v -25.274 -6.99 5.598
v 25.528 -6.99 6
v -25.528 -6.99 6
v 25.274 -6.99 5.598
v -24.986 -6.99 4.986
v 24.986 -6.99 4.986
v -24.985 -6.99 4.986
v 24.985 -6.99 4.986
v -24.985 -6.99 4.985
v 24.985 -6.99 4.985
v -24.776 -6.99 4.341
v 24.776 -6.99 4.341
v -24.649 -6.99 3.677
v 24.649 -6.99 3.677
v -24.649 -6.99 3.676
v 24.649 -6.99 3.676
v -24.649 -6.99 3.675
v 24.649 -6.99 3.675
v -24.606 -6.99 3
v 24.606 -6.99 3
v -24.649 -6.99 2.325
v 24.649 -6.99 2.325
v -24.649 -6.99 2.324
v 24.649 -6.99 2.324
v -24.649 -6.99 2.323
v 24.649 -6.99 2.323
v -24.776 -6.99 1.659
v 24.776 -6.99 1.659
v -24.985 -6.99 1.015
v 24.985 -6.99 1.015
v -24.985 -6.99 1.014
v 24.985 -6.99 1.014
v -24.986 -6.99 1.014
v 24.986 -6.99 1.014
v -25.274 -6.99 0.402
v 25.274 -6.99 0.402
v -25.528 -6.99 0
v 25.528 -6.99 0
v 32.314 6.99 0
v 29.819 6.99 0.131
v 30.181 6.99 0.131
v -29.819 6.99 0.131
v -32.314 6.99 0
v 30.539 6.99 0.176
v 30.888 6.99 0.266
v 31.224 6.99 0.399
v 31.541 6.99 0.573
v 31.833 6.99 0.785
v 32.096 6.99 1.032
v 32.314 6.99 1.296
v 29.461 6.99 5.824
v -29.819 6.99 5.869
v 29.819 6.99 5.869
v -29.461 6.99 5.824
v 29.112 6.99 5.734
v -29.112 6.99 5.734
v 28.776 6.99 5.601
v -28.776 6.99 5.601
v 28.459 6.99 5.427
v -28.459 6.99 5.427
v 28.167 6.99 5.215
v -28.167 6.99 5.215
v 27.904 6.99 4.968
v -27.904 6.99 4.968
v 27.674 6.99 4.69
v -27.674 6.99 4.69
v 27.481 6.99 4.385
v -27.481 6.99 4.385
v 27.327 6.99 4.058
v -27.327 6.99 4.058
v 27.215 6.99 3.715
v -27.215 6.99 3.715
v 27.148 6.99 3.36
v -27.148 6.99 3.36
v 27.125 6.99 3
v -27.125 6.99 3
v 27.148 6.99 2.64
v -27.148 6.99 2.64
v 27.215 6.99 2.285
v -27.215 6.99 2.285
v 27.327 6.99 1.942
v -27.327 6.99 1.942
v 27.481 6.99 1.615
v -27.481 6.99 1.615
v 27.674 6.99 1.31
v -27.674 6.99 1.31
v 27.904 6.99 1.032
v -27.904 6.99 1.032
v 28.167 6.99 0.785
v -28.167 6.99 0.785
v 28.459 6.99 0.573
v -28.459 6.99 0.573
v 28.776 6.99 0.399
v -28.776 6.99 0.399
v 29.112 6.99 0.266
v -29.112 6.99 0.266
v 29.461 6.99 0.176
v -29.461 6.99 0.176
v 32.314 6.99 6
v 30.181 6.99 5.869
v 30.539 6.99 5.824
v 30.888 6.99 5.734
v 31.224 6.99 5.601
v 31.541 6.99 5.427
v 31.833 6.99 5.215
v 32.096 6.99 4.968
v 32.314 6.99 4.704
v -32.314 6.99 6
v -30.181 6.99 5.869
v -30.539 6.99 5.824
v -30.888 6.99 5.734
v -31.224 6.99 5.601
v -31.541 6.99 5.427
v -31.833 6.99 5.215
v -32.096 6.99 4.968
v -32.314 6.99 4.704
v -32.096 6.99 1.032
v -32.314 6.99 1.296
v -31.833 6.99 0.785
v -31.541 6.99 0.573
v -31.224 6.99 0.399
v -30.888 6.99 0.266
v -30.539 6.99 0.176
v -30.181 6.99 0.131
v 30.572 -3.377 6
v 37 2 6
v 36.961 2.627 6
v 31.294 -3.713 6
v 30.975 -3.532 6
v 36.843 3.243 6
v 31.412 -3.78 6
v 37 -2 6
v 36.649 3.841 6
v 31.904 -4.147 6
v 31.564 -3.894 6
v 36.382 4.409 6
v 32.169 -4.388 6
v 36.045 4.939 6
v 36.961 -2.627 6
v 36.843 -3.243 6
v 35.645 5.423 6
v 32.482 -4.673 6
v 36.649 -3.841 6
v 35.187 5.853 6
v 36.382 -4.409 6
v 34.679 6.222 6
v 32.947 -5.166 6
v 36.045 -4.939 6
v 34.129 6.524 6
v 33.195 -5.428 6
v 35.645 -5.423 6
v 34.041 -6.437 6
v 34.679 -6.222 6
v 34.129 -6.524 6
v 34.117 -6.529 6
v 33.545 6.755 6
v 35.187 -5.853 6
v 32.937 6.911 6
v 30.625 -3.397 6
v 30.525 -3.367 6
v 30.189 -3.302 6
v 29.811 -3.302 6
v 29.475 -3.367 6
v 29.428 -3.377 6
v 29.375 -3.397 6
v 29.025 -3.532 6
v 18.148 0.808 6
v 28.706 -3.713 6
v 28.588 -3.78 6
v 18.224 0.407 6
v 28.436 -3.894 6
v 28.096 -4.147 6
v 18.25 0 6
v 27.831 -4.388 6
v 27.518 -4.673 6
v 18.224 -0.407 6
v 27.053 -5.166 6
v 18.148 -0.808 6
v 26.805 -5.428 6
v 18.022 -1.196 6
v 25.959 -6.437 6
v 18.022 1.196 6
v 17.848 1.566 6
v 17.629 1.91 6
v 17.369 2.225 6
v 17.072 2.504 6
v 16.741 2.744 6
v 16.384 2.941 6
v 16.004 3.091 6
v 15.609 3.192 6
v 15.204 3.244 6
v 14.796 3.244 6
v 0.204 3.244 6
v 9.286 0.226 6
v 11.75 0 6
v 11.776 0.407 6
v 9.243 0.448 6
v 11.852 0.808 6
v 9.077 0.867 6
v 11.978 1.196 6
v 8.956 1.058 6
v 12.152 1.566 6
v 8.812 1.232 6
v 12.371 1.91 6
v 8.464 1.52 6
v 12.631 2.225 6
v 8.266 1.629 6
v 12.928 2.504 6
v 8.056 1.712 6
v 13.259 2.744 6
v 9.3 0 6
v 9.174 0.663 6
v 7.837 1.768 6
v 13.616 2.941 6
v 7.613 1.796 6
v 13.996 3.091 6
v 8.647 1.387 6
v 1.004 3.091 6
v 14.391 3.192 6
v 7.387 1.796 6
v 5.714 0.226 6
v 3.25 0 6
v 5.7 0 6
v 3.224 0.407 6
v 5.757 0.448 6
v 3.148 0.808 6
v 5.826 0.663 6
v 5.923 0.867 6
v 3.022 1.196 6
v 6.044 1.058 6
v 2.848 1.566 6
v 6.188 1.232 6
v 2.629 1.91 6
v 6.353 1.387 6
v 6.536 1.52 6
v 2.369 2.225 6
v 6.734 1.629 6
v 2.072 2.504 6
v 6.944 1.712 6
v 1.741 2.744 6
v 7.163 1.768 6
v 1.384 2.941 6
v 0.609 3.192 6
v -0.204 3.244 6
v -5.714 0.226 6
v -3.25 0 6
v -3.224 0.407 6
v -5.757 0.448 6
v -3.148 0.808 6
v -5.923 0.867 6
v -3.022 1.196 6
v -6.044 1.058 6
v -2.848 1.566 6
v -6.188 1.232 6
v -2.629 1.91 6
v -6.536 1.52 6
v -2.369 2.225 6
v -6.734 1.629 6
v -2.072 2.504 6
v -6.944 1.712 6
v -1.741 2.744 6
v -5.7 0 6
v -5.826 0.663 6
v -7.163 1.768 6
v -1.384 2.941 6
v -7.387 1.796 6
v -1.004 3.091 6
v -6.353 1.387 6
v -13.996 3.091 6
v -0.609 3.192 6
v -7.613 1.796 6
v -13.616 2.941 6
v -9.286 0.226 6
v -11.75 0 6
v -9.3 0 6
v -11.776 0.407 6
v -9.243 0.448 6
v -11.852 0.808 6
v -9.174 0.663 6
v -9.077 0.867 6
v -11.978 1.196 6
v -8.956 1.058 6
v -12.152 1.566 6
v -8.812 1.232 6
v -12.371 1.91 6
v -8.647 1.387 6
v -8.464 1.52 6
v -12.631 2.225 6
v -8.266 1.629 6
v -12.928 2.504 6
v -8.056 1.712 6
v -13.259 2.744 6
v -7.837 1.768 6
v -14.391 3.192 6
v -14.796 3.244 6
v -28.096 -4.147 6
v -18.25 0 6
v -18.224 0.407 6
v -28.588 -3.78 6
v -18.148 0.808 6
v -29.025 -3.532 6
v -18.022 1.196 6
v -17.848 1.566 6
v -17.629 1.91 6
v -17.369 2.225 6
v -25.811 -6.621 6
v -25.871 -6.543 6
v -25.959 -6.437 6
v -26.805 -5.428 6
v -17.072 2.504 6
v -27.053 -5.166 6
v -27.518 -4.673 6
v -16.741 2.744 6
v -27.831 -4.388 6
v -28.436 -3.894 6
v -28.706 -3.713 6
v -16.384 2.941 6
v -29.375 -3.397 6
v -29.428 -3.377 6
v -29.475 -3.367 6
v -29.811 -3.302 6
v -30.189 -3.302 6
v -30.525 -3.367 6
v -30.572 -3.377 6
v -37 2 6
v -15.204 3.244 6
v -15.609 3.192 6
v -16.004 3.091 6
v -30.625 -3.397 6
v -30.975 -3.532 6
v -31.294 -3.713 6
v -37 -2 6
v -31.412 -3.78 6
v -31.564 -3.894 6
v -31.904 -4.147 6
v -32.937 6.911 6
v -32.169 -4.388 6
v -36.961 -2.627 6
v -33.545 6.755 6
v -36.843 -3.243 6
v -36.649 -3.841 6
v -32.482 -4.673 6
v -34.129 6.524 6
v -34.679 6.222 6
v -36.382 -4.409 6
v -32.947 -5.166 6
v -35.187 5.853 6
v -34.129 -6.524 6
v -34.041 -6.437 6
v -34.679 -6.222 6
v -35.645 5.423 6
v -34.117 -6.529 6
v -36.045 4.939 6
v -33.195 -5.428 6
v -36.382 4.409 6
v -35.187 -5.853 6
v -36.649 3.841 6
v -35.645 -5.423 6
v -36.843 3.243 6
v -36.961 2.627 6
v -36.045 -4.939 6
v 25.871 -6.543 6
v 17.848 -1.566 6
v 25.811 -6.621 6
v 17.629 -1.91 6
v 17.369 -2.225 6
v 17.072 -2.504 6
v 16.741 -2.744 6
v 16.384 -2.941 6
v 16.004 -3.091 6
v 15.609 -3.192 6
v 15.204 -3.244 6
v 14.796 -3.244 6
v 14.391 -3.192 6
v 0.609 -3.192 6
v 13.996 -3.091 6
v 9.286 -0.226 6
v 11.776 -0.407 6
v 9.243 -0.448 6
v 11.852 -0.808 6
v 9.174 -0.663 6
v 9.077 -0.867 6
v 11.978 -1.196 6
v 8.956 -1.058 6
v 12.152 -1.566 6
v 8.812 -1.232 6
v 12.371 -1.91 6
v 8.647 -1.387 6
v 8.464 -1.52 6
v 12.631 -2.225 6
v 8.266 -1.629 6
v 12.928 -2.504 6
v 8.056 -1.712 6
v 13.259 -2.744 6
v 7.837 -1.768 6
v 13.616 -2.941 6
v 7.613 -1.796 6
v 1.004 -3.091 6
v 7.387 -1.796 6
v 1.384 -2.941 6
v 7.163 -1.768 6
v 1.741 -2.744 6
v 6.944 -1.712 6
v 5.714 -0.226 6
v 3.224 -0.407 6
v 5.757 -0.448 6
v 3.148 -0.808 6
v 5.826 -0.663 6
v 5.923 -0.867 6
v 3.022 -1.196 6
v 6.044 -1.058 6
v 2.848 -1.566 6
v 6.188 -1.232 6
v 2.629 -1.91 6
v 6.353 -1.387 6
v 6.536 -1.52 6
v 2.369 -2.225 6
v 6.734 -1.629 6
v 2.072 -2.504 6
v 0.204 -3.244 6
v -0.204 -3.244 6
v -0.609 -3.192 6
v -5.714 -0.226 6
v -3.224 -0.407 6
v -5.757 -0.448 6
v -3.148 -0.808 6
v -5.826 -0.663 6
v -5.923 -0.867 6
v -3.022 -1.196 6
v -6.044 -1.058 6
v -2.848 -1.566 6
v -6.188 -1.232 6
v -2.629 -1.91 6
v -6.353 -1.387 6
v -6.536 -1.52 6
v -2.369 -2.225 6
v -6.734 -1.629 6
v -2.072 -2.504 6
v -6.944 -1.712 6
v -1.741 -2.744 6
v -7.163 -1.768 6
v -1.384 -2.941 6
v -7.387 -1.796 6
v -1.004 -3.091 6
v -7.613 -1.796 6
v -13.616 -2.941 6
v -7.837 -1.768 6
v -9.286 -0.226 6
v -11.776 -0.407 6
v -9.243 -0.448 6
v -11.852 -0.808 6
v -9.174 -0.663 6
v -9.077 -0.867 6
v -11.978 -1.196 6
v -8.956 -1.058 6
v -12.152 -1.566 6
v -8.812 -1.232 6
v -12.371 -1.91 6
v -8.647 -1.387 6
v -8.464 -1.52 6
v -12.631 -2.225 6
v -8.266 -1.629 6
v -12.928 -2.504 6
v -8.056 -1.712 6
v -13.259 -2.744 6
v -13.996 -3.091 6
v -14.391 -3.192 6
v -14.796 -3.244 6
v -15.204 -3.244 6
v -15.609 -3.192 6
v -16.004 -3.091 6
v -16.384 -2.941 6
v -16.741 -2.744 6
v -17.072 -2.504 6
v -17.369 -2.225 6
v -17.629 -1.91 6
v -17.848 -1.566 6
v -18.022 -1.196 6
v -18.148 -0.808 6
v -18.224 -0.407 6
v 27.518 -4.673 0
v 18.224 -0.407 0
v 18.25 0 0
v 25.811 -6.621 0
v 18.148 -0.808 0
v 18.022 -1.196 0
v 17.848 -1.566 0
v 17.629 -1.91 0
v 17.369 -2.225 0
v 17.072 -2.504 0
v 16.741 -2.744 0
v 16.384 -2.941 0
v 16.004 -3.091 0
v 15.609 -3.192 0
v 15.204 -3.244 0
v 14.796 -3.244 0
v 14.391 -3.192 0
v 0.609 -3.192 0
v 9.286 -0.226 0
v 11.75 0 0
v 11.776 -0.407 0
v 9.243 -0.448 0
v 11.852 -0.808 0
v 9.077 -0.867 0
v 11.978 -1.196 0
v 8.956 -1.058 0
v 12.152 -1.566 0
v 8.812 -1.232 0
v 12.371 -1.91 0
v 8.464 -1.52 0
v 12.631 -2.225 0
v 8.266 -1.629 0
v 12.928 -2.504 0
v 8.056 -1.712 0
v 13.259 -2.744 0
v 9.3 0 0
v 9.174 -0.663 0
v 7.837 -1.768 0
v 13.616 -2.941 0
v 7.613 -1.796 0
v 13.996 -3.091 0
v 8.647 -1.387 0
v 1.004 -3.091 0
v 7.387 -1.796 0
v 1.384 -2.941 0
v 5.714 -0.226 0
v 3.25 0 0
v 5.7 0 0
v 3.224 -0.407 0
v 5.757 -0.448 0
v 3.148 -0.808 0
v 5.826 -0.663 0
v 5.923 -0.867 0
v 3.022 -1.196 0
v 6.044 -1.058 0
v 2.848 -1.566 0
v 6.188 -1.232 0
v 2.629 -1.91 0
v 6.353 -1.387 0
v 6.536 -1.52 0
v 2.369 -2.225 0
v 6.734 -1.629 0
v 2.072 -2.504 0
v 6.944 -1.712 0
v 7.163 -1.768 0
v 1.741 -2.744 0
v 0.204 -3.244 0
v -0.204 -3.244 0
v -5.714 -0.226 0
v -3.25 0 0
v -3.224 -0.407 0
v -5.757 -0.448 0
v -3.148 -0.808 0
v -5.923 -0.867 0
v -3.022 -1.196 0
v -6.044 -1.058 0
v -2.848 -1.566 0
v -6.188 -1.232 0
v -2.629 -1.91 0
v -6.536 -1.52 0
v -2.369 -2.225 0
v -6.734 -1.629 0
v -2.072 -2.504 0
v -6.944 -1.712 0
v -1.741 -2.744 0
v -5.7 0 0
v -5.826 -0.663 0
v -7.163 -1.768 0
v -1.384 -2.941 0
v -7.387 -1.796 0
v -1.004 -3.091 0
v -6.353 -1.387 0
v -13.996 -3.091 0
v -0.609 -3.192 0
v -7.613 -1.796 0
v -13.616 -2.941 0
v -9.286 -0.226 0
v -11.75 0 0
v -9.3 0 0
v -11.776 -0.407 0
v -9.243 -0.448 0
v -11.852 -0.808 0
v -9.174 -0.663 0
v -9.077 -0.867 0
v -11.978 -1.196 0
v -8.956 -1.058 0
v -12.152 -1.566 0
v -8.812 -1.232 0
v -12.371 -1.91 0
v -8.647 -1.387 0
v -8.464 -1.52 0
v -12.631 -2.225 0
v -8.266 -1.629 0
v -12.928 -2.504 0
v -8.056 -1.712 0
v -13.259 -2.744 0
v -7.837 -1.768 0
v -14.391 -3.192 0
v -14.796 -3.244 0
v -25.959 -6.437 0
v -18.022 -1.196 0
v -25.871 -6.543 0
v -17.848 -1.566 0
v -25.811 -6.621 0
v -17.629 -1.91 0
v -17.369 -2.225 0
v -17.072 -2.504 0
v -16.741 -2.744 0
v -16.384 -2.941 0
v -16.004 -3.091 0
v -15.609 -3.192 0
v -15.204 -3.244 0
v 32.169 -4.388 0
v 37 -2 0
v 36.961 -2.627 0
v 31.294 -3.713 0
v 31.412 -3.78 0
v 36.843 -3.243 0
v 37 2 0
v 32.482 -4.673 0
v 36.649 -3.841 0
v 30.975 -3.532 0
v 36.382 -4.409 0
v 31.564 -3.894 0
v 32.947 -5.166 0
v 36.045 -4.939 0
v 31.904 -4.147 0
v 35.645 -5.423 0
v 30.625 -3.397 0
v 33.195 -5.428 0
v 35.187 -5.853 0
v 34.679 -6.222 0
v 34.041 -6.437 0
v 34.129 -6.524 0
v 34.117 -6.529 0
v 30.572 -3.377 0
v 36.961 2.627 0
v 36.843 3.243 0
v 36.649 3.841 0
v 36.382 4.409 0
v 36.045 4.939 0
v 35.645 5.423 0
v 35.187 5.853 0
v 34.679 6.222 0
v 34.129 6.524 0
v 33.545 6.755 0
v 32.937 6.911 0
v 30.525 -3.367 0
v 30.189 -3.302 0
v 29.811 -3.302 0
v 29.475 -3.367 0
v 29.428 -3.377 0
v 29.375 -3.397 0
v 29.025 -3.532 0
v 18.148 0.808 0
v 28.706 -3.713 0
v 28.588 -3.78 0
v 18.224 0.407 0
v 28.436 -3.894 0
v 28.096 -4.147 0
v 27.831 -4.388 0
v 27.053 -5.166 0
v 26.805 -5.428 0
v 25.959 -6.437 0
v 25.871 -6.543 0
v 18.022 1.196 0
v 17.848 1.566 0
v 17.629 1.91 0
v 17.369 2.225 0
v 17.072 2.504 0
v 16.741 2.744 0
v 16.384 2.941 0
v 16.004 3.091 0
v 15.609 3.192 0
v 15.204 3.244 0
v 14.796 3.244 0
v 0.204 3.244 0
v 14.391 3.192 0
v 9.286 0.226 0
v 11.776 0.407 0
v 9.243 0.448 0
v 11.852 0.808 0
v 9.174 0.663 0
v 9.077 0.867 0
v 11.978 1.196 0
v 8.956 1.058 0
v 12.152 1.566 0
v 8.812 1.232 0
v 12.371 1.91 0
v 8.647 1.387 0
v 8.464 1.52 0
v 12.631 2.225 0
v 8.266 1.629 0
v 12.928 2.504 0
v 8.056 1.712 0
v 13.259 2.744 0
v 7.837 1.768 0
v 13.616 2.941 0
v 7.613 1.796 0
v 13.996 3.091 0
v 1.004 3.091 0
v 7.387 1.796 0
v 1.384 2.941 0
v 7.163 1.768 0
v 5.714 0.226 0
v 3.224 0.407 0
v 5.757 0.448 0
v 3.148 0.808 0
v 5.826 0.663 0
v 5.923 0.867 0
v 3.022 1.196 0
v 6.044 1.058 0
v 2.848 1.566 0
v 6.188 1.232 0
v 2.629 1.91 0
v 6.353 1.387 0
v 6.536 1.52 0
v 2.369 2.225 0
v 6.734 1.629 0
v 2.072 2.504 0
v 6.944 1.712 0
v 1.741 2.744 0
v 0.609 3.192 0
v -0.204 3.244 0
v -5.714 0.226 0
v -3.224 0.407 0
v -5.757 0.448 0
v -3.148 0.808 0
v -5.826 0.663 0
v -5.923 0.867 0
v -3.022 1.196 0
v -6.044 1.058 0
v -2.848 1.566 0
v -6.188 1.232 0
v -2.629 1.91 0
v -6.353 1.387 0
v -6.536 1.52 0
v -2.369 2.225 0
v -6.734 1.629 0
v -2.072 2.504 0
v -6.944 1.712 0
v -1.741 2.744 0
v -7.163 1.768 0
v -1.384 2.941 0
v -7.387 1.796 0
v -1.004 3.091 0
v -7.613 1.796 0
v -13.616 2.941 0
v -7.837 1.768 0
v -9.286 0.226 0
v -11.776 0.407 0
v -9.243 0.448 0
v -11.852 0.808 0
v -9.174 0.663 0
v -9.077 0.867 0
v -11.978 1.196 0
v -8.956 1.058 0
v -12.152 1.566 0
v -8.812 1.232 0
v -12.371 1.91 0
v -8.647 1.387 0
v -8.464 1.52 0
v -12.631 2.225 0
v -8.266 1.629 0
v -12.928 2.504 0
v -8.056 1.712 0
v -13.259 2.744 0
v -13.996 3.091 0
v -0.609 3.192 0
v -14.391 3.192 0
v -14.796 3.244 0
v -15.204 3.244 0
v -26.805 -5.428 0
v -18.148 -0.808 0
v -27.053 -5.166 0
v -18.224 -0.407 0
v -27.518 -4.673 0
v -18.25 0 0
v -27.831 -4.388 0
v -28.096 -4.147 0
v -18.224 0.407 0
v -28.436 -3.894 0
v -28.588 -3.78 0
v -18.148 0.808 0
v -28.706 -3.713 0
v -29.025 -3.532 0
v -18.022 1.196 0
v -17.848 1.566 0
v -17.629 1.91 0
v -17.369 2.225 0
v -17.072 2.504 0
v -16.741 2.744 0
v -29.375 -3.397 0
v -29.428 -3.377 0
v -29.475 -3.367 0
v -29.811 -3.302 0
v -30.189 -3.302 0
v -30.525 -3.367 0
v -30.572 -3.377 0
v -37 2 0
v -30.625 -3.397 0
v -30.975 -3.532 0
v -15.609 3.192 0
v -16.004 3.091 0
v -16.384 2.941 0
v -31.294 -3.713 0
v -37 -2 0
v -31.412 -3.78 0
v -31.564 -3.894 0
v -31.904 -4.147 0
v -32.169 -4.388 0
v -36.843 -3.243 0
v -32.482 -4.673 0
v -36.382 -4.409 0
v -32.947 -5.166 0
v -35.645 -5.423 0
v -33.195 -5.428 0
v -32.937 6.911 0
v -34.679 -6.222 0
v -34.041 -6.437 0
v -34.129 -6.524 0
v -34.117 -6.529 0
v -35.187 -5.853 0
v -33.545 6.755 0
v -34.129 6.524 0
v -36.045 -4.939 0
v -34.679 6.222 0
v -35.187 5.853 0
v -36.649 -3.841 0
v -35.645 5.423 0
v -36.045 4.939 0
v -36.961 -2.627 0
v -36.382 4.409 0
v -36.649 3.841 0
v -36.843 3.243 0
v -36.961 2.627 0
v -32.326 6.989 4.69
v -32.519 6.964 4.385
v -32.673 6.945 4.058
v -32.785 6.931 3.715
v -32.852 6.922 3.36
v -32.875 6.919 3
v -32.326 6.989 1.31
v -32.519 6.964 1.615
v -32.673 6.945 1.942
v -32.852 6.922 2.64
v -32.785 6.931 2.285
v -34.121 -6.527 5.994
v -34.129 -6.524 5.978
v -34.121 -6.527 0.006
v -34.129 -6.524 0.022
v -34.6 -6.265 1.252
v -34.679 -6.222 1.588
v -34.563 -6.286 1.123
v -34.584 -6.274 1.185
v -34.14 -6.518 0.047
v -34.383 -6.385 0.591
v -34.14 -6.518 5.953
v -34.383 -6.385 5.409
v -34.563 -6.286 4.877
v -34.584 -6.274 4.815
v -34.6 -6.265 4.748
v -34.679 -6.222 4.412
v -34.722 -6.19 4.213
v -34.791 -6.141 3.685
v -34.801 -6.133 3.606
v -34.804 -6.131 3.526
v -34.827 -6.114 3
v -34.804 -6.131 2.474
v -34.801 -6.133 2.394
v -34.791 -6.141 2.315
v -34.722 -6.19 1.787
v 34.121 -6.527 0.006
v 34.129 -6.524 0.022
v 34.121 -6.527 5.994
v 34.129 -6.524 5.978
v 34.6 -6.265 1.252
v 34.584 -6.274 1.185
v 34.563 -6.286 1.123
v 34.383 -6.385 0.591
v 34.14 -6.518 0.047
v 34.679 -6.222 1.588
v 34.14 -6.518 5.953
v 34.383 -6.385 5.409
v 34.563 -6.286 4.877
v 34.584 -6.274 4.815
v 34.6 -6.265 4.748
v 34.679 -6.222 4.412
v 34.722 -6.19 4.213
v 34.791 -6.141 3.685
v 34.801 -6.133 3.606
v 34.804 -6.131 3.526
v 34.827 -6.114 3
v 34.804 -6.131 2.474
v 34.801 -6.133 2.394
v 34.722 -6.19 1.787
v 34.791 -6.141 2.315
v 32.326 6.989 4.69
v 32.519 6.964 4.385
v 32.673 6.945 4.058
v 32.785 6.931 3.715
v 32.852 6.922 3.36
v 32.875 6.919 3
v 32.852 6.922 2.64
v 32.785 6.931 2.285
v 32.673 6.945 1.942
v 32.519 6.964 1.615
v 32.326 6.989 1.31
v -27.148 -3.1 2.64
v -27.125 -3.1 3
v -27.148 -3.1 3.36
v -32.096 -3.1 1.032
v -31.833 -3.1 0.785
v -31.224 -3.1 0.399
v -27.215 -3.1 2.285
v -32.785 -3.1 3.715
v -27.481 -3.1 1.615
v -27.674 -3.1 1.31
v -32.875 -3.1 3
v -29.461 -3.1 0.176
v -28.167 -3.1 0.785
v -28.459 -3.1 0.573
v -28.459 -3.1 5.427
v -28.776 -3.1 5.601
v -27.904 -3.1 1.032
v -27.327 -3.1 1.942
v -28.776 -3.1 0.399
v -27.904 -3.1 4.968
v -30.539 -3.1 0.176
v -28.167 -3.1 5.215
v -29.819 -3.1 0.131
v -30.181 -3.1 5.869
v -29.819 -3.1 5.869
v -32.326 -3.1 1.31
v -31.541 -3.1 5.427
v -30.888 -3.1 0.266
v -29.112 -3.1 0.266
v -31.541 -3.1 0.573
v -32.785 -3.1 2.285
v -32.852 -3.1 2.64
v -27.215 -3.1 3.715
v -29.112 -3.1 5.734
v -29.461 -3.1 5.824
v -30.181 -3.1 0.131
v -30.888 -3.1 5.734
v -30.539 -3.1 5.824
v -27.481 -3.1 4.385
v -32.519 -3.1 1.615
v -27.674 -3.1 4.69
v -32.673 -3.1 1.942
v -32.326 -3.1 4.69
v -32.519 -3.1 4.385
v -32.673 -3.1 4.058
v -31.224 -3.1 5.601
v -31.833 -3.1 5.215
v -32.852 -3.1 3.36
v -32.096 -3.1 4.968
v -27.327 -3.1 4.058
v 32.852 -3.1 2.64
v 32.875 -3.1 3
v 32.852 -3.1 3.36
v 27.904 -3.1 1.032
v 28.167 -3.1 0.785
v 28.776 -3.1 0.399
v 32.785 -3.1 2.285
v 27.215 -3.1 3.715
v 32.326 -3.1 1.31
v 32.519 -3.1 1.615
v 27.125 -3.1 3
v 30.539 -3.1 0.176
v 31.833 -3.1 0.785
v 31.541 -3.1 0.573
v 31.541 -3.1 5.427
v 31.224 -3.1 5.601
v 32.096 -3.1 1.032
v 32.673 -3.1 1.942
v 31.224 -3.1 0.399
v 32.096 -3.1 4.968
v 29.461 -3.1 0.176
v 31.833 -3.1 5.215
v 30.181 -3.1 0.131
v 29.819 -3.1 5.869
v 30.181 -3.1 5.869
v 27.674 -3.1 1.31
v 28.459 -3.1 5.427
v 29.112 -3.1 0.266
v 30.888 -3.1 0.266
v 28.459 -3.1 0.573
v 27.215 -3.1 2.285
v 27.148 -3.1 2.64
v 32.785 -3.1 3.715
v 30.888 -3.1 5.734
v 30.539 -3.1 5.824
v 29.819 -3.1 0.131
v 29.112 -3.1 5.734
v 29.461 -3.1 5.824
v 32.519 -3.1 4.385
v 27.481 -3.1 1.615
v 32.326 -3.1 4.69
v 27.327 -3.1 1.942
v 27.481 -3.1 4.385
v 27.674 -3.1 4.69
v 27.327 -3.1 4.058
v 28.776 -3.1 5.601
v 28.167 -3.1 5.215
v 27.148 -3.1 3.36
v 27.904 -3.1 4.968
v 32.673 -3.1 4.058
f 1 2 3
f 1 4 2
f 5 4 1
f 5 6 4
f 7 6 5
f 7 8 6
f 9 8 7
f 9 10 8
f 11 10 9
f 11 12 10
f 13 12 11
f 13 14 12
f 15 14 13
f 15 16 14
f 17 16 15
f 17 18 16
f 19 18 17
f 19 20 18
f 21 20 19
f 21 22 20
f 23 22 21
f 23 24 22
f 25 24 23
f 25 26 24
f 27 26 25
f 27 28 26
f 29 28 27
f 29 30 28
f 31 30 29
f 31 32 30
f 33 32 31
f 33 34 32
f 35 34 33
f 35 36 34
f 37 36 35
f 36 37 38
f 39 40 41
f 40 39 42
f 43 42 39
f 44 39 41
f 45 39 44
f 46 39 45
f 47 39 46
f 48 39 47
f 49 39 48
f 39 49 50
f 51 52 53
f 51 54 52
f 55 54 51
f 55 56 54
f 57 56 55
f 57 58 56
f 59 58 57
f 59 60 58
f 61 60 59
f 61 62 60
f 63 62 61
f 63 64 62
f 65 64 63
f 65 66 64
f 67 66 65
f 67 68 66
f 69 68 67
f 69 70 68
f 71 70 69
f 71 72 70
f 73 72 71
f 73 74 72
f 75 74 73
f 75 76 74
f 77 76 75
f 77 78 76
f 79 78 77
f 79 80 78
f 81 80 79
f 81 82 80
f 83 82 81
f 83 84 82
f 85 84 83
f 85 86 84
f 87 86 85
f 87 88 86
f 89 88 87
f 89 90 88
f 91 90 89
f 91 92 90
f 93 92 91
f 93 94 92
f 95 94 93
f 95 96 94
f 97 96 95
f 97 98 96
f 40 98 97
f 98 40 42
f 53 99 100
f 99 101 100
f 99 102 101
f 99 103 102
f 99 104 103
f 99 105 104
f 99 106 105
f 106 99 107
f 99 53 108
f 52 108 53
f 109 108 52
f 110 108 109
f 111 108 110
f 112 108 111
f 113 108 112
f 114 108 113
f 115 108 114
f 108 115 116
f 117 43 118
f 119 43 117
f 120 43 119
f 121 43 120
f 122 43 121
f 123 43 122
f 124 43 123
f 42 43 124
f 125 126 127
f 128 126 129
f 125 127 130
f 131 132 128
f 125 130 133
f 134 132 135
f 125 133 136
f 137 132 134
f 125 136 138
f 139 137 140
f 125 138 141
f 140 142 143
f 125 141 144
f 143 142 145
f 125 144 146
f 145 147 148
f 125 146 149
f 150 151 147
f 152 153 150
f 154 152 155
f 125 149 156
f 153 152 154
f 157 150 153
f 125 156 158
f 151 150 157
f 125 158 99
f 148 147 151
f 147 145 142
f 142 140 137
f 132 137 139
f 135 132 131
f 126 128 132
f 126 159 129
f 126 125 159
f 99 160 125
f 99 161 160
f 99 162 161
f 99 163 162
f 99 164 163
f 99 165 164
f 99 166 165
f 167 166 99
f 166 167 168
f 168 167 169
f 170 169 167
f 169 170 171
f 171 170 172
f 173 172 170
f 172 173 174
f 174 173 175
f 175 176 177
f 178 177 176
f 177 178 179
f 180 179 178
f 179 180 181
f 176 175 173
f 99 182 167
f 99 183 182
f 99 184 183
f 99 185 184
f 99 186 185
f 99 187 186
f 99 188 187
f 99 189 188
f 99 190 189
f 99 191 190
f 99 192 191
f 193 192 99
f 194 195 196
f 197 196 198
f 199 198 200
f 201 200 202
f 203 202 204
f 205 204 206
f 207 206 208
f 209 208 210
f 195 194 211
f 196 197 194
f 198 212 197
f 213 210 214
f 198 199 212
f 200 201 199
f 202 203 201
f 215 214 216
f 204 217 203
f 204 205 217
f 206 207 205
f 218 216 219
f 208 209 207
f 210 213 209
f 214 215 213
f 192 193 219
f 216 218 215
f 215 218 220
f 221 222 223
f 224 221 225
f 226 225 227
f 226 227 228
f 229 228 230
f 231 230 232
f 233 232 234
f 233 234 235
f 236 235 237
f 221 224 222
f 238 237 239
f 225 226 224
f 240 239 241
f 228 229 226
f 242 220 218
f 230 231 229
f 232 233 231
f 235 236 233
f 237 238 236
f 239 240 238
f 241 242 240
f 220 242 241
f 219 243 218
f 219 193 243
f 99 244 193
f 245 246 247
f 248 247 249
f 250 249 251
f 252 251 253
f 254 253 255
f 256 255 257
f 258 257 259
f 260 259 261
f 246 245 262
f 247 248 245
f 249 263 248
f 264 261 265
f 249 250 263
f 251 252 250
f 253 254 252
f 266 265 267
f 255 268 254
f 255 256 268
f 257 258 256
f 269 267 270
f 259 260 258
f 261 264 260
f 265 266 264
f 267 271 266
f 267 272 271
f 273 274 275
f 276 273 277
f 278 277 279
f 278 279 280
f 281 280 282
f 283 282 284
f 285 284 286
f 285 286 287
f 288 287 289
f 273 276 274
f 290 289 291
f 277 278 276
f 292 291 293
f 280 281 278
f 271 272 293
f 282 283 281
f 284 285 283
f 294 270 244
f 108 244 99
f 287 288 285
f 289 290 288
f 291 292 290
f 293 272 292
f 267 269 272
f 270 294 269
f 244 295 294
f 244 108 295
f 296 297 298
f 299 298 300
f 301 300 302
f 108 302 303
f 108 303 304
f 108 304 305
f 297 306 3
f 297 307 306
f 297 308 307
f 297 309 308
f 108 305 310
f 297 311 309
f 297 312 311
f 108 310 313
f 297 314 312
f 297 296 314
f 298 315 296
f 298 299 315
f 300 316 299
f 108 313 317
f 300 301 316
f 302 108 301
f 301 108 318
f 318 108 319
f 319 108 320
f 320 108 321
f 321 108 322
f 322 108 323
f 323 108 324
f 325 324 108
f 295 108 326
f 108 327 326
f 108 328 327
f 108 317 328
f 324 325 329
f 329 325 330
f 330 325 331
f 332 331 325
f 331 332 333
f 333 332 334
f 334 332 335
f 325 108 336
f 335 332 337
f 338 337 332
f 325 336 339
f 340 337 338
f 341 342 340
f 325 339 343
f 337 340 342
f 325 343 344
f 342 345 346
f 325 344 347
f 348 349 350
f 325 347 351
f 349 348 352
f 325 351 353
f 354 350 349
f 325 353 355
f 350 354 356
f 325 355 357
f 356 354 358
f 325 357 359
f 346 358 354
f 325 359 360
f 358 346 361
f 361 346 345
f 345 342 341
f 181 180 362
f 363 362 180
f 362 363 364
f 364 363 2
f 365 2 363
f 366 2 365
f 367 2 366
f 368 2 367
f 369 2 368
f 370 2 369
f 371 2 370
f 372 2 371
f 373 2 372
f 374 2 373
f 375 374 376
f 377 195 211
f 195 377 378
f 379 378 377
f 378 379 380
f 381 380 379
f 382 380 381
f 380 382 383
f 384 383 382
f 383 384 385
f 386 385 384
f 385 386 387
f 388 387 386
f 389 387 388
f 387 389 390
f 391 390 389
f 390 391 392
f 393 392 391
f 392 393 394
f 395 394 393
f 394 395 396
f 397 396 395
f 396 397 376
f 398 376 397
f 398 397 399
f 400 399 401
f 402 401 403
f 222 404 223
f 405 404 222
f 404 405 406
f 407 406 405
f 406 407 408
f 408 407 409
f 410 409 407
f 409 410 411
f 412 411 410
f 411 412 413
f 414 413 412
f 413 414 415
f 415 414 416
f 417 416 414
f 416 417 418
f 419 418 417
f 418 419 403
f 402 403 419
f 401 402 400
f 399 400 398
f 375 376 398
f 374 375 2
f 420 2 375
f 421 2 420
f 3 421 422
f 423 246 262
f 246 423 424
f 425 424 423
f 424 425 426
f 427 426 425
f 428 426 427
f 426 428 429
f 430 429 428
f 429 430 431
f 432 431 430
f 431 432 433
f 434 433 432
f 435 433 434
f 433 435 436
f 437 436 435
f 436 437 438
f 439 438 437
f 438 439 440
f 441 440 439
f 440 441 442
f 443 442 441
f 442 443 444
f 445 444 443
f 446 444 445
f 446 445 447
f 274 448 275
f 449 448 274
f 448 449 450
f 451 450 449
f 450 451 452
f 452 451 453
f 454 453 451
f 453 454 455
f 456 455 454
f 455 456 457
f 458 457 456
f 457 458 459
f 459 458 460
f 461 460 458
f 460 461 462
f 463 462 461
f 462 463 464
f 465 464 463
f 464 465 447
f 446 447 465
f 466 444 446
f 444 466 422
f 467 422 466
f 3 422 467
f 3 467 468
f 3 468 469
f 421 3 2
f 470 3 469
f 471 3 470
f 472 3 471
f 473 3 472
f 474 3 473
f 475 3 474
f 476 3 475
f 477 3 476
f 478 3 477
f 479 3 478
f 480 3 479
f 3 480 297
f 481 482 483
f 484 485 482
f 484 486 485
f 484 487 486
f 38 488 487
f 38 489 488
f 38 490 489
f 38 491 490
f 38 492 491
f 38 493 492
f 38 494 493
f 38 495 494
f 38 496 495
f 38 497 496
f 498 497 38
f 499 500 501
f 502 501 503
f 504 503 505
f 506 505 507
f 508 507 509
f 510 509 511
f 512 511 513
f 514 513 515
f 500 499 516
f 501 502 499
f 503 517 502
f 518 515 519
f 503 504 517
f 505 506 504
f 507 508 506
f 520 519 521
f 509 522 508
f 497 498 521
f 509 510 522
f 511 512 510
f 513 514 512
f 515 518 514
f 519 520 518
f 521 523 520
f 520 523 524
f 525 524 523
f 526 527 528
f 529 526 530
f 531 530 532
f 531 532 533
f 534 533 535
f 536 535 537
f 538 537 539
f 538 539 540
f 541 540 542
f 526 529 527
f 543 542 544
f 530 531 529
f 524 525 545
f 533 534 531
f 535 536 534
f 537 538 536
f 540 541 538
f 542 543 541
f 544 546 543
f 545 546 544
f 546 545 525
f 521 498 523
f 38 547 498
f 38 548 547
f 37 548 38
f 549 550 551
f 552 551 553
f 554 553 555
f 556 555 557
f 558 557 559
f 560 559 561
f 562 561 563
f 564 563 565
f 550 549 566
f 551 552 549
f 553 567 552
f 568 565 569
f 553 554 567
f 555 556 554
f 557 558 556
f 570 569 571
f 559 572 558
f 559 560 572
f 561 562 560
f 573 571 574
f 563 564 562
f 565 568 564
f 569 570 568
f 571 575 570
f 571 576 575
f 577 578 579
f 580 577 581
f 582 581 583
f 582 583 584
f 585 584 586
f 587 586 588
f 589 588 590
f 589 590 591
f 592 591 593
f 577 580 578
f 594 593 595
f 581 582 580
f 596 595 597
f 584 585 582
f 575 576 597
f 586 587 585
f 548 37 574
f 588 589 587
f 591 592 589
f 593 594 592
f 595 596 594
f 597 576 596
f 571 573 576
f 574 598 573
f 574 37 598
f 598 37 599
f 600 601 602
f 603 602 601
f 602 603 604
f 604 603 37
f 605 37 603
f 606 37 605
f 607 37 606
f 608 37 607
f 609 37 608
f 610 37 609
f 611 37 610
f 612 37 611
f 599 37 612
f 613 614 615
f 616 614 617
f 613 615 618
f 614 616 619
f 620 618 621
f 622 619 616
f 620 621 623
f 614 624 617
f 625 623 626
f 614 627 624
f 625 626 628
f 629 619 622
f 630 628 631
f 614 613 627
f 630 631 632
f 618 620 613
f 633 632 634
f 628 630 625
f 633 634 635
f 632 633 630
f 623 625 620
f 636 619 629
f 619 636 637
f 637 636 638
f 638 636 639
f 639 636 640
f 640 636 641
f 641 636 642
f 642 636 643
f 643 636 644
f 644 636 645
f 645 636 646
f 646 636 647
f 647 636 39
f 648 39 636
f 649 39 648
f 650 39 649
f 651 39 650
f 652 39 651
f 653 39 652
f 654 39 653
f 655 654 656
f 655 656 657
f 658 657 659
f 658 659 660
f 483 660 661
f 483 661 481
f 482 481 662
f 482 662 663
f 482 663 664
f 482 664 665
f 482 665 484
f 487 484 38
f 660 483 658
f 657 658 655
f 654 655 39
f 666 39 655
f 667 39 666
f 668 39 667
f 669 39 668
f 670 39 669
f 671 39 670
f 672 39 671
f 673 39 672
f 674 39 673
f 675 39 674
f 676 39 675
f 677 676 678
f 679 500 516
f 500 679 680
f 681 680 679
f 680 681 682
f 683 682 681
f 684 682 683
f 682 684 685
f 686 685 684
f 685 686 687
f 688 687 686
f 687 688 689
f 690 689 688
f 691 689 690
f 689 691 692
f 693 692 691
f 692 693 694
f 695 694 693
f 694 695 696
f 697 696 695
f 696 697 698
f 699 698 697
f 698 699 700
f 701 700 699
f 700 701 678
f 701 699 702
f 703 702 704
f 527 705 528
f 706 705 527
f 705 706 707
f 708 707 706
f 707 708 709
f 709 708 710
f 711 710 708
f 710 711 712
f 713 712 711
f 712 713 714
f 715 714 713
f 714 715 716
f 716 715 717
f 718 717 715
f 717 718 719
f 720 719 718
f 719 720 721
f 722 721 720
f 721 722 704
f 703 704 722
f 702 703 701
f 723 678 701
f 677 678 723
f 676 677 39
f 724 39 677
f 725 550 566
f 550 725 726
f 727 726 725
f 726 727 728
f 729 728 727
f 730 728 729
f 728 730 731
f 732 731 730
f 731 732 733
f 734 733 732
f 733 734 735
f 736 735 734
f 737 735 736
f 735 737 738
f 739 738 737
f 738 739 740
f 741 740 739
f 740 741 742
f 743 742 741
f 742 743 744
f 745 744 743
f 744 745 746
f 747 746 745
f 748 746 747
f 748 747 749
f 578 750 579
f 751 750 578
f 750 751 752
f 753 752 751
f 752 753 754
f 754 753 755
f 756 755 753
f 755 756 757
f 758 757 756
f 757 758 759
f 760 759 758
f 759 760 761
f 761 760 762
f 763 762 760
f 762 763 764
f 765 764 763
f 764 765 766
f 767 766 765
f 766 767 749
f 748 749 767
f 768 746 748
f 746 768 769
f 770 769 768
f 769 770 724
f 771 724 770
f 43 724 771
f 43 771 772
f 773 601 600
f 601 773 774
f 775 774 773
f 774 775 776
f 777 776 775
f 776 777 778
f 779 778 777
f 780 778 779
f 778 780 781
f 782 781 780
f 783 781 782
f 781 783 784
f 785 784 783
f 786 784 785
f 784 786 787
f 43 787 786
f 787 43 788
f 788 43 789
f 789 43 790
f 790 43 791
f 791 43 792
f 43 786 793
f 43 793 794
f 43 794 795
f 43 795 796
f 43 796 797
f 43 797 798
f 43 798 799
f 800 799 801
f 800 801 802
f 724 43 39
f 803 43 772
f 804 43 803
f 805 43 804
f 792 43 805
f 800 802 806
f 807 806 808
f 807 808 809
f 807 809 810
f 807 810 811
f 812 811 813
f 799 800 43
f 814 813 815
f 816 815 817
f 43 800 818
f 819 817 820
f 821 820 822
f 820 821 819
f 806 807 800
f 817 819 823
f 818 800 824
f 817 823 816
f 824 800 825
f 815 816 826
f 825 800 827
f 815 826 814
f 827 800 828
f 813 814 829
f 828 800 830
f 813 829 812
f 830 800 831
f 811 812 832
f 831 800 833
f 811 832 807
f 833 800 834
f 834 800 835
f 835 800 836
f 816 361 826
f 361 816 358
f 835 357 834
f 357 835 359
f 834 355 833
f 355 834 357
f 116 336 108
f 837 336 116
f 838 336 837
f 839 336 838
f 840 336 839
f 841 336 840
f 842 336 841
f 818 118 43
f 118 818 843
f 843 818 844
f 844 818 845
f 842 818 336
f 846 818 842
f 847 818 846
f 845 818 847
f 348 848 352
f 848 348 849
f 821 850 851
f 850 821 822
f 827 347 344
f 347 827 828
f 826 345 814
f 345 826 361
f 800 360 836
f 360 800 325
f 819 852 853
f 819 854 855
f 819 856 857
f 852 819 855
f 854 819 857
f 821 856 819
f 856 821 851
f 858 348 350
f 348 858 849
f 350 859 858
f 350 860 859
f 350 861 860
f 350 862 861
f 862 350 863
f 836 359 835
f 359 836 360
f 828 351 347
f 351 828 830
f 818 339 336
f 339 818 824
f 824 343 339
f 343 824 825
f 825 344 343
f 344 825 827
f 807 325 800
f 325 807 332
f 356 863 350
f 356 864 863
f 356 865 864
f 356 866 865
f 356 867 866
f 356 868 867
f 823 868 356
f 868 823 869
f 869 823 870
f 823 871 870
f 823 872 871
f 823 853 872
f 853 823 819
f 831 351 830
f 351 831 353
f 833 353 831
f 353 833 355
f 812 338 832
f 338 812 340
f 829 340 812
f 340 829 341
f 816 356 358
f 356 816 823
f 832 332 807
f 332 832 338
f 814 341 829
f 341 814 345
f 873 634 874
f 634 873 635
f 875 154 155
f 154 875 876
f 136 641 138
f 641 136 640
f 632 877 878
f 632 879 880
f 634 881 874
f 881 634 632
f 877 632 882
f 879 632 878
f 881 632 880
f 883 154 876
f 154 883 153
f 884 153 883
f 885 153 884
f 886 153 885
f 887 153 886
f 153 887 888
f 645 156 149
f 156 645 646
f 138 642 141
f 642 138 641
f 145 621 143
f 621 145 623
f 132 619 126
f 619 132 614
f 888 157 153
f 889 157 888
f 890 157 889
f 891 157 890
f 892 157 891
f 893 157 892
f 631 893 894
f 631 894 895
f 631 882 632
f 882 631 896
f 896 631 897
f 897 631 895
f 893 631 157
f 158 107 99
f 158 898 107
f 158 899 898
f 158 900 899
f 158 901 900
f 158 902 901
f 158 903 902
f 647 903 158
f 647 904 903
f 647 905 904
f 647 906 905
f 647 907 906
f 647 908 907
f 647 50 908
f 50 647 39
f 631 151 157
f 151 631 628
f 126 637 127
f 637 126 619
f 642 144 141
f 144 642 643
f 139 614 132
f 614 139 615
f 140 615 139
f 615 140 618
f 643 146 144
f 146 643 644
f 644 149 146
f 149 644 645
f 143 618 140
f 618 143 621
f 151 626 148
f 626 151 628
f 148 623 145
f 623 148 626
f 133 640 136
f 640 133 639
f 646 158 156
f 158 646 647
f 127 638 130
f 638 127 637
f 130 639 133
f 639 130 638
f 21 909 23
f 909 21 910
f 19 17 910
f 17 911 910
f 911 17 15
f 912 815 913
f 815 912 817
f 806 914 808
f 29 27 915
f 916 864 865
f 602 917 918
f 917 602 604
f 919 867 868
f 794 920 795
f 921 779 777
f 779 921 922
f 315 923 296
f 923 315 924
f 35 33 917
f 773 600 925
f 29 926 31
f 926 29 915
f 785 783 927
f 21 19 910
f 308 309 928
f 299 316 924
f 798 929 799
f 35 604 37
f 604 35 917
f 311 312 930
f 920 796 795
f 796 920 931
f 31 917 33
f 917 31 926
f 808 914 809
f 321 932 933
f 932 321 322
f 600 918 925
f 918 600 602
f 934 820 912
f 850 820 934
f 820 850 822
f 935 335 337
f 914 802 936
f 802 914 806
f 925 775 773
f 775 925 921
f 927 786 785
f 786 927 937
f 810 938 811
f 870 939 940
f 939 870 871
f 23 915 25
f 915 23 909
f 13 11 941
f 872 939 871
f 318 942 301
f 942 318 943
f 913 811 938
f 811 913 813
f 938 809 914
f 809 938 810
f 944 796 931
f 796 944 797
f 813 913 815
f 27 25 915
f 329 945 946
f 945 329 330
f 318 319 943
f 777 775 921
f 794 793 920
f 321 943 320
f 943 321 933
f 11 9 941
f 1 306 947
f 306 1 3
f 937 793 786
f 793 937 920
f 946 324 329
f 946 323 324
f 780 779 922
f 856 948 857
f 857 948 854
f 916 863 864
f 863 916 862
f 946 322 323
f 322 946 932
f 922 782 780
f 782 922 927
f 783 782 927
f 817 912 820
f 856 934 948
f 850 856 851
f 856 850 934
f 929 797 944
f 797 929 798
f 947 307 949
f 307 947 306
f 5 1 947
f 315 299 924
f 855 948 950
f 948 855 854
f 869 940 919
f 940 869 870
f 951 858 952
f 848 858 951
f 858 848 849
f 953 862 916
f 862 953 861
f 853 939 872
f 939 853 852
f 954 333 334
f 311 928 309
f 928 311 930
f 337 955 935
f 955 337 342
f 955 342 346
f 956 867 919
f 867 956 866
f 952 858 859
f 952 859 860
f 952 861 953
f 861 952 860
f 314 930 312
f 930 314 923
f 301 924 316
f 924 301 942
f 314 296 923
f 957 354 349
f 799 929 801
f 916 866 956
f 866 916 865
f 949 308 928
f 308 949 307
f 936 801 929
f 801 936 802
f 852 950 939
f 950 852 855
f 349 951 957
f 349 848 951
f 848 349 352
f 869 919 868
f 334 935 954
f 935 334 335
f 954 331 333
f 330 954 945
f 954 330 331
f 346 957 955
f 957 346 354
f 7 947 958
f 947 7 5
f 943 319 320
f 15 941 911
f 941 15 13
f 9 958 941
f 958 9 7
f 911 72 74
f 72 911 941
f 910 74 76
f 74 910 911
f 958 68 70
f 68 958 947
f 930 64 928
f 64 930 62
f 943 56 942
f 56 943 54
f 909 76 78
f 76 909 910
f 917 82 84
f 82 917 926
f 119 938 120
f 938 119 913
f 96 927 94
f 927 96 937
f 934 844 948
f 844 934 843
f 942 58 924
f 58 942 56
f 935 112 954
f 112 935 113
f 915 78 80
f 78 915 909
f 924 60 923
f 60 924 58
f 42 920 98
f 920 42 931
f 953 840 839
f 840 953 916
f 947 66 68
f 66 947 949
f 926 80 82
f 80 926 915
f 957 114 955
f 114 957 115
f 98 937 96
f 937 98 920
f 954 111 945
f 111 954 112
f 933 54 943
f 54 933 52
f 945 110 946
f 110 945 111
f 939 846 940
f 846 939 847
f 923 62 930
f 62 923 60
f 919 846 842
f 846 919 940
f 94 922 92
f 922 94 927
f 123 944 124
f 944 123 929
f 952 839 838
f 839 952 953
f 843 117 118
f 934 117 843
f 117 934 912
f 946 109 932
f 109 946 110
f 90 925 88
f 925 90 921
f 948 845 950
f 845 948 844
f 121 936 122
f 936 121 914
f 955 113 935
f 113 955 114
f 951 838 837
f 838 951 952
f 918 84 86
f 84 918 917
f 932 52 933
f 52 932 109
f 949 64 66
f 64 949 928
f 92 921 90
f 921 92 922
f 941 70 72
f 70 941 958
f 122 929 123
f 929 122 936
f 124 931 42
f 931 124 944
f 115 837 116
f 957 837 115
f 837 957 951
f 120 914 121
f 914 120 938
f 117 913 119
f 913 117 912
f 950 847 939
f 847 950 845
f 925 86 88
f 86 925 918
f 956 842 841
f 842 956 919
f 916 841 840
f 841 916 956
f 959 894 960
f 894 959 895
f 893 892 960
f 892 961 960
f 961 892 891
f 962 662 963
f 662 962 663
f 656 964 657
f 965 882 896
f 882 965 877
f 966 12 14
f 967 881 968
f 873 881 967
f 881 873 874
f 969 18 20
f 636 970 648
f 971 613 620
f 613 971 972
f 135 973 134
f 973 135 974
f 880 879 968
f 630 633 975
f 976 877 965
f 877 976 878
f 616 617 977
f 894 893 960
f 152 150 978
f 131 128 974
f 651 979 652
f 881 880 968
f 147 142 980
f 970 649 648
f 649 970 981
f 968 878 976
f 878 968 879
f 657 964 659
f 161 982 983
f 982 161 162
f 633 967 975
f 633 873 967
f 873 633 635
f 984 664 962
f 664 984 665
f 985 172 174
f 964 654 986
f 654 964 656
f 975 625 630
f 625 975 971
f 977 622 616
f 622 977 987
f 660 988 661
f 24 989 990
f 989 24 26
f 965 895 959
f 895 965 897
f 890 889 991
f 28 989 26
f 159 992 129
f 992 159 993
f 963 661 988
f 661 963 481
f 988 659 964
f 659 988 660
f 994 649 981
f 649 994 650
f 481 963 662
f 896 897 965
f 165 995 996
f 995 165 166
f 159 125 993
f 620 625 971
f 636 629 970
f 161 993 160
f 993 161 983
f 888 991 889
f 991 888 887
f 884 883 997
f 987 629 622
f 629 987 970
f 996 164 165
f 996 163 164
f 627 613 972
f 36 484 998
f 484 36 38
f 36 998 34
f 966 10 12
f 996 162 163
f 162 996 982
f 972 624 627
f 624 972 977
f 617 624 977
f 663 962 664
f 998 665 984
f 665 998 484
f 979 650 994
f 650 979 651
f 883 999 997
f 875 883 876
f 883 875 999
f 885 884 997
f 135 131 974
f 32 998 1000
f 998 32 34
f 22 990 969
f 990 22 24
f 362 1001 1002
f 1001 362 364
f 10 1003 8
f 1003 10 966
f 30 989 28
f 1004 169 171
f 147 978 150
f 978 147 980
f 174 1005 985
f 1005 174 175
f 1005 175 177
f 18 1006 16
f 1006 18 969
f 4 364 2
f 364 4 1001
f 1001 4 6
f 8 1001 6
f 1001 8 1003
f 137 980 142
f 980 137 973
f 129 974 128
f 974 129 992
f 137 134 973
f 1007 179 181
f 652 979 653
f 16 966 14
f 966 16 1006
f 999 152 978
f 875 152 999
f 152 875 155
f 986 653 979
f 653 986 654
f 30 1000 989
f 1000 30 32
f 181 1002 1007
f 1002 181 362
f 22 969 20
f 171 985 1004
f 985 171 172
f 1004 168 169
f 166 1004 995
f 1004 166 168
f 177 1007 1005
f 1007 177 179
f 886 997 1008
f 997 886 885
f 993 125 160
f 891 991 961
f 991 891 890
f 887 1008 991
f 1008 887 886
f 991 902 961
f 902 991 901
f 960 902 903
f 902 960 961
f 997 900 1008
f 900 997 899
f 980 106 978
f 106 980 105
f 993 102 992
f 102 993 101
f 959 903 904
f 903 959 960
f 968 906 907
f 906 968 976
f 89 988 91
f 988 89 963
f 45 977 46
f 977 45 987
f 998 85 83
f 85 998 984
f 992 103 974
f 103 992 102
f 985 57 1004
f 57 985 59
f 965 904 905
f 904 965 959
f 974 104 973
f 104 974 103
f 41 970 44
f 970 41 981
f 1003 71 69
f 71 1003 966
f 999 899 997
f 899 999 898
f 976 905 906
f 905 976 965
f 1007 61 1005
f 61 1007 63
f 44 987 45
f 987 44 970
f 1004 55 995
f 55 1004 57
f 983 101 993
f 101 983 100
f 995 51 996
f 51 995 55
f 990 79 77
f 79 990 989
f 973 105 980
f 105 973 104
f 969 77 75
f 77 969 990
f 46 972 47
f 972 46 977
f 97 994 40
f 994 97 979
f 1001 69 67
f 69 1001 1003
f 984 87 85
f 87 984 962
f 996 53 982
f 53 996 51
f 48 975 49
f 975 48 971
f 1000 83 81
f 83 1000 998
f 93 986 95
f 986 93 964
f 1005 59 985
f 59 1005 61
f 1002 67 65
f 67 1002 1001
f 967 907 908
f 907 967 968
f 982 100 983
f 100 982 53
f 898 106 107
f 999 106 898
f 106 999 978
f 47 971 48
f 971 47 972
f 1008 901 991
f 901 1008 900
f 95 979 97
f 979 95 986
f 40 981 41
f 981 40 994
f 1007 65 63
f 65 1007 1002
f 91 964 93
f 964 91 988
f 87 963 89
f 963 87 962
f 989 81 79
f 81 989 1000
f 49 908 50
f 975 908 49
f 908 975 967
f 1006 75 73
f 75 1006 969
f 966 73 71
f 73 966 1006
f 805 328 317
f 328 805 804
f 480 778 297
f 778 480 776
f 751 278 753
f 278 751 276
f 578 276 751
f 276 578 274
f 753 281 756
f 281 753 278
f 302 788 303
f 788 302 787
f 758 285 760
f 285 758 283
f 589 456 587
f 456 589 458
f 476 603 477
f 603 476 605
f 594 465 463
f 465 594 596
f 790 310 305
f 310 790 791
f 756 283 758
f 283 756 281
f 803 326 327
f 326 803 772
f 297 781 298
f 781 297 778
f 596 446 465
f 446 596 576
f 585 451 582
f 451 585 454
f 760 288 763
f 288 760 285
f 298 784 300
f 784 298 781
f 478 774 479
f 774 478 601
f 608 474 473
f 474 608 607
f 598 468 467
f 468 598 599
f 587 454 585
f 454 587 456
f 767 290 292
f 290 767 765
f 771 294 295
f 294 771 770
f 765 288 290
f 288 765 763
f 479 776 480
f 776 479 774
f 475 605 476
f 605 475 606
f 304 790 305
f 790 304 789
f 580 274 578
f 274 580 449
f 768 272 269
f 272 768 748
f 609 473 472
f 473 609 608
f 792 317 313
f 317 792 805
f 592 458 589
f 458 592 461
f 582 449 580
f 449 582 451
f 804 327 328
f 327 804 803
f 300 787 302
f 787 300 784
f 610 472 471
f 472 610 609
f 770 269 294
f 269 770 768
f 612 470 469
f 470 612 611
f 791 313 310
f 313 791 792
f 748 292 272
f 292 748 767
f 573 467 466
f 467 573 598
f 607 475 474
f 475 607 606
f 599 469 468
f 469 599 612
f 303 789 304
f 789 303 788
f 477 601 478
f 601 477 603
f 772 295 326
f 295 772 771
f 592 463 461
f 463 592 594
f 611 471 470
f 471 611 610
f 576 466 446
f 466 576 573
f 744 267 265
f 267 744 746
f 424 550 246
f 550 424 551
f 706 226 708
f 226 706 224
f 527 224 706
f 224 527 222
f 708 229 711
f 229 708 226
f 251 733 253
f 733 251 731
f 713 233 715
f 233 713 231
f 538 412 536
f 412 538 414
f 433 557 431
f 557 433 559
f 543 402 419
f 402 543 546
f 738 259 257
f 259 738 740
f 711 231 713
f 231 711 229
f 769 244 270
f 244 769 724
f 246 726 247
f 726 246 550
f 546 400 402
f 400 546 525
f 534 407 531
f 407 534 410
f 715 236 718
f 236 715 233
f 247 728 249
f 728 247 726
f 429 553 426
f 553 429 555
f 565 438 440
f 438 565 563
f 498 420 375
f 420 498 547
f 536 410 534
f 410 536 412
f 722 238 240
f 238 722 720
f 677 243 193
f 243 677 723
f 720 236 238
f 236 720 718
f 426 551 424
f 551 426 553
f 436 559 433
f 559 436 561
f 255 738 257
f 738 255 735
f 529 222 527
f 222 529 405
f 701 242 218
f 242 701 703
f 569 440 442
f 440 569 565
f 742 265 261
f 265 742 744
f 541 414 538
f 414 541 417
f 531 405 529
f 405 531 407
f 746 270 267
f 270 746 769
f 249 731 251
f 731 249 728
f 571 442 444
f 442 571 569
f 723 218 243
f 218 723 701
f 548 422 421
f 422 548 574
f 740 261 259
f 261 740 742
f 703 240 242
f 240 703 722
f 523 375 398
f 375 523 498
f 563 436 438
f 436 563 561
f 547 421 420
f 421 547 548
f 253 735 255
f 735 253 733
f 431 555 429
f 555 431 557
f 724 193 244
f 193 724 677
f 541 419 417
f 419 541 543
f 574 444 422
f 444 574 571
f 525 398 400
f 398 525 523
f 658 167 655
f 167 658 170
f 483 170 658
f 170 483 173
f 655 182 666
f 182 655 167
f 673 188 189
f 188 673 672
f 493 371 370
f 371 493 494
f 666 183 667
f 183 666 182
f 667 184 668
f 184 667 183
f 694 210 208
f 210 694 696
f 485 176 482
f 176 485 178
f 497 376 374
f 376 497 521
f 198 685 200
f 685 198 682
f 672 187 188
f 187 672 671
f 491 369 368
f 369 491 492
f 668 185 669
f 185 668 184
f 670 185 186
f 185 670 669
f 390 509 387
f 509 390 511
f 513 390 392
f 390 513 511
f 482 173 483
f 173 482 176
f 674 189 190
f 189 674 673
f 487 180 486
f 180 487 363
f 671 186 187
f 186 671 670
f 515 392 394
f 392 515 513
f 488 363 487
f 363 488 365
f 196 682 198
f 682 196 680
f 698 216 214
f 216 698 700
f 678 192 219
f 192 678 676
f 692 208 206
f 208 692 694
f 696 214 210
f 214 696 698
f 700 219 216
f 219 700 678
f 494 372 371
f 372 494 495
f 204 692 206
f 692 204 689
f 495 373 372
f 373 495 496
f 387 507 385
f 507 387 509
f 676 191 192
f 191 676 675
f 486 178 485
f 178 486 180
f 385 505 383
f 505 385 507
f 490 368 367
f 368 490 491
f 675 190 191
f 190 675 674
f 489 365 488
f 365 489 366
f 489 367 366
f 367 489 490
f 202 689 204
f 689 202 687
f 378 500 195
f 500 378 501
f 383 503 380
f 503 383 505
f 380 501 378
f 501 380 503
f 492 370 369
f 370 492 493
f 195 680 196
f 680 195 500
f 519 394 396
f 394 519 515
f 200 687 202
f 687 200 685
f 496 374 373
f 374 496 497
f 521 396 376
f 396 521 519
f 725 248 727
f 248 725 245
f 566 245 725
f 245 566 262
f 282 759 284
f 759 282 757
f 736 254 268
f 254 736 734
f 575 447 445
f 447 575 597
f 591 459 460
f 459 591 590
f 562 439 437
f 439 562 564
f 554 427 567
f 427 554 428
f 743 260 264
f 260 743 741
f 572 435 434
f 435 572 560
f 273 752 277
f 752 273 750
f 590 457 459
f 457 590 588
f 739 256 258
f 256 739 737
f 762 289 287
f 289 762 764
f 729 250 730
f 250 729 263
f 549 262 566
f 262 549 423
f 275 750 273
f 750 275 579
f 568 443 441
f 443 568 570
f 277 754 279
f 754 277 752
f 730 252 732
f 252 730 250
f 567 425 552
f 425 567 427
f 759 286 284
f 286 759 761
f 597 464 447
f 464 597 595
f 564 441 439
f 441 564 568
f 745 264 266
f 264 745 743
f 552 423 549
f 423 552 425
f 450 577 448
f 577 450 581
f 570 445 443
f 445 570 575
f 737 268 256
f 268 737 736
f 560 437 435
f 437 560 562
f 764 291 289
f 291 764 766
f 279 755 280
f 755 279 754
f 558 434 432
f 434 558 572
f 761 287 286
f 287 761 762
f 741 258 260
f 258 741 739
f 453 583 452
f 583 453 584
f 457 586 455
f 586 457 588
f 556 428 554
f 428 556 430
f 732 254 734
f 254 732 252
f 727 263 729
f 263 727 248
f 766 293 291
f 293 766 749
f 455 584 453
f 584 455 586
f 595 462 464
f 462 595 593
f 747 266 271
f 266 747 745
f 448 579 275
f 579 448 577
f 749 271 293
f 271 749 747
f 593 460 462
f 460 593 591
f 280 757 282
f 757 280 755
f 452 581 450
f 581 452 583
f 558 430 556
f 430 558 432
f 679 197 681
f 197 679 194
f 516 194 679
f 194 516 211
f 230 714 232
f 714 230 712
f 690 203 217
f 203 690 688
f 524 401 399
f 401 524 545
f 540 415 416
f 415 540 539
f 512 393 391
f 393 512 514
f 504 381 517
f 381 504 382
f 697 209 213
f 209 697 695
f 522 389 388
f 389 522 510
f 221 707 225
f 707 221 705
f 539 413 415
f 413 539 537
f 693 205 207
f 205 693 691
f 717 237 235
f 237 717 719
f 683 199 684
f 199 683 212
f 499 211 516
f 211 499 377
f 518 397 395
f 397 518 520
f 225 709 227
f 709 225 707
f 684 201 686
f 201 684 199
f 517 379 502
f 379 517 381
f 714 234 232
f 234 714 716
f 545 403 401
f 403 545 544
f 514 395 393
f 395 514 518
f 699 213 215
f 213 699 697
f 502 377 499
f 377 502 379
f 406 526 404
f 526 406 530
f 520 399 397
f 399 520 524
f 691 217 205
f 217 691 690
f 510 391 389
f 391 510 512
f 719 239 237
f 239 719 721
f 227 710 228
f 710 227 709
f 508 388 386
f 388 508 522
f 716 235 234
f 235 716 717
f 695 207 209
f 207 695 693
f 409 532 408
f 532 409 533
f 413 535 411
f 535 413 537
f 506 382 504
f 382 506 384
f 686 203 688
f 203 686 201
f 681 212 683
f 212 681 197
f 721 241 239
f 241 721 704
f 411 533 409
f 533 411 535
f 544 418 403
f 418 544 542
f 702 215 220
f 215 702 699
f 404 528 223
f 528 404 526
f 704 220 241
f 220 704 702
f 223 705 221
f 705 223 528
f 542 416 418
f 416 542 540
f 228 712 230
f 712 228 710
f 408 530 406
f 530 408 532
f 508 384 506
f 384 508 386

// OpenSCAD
$fn = 50;


difference() {
	union() {
		hull() {
			translate(v = [-17.0000000000, 2.0000000000, 0]) {
				cylinder(h = 6, r = 5);
			}
			translate(v = [17.0000000000, 2.0000000000, 0]) {
				cylinder(h = 6, r = 5);
			}
			translate(v = [-17.0000000000, -2.0000000000, 0]) {
				cylinder(h = 6, r = 5);
			}
			translate(v = [17.0000000000, -2.0000000000, 0]) {
				cylinder(h = 6, r = 5);
			}
		}
		translate(v = [-22.5000000000, 0.0000000000, 0]) {
			hull() {
				translate(v = [-9.5000000000, 2.0000000000, 0]) {
					cylinder(h = 6, r = 5);
				}
				translate(v = [9.5000000000, 2.0000000000, 0]) {
					cylinder(h = 6, r = 5);
				}
				translate(v = [-9.5000000000, -2.0000000000, 0]) {
					cylinder(h = 6, r = 5);
				}
				translate(v = [9.5000000000, -2.0000000000, 0]) {
					cylinder(h = 6, r = 5);
				}
			}
		}
		translate(v = [-22.5000000000, 0.0000000000, 0]) {
			hull() {
				translate(v = [-9.5000000000, 2.0000000000, 0]) {
					cylinder(h = 6, r = 5);
				}
				translate(v = [9.5000000000, 2.0000000000, 0]) {
					cylinder(h = 6, r = 5);
				}
				translate(v = [-9.5000000000, -2.0000000000, 0]) {
					cylinder(h = 6, r = 5);
				}
				translate(v = [9.5000000000, -2.0000000000, 0]) {
					cylinder(h = 6, r = 5);
				}
			}
		}
		translate(v = [22.5000000000, 0.0000000000, 0]) {
			hull() {
				translate(v = [-9.5000000000, 2.0000000000, 0]) {
					cylinder(h = 6, r = 5);
				}
				translate(v = [9.5000000000, 2.0000000000, 0]) {
					cylinder(h = 6, r = 5);
				}
				translate(v = [-9.5000000000, -2.0000000000, 0]) {
					cylinder(h = 6, r = 5);
				}
				translate(v = [9.5000000000, -2.0000000000, 0]) {
					cylinder(h = 6, r = 5);
				}
			}
		}
		translate(v = [22.5000000000, 0.0000000000, 0]) {
			hull() {
				translate(v = [-9.5000000000, 2.0000000000, 0]) {
					cylinder(h = 6, r = 5);
				}
				translate(v = [9.5000000000, 2.0000000000, 0]) {
					cylinder(h = 6, r = 5);
				}
				translate(v = [-9.5000000000, -2.0000000000, 0]) {
					cylinder(h = 6, r = 5);
				}
				translate(v = [9.5000000000, -2.0000000000, 0]) {
					cylinder(h = 6, r = 5);
				}
			}
		}
	}
	union() {
		translate(v = [-30.0000000000, -7.0000000000, 3.0000000000]) {
			rotate(a = [90, 0, 0]) {
				difference() {
					union() {
						#translate(v = [0, 0, -14.0000000000]) {
							cylinder(h = 14, r = 2.6000000000);
						}
						#translate(v = [0, 0, -3.9000000000]) {
							cylinder(h = 3.9000000000, r1 = 2.8750000000, r2 = 5.4000000000);
						}
						#translate(v = [0, 0, -14.0000000000]) {
							cylinder(h = 14, r = 2.8750000000);
						}
						#translate(v = [0, 0, -14.0000000000]) {
							cylinder(h = 14, r = 2.6000000000);
						}
					}
					union();
				}
			}
		}
		translate(v = [30.0000000000, -7.0000000000, 3.0000000000]) {
			rotate(a = [90, 0, 0]) {
				difference() {
					union() {
						#translate(v = [0, 0, -14.0000000000]) {
							cylinder(h = 14, r = 2.6000000000);
						}
						#translate(v = [0, 0, -3.9000000000]) {
							cylinder(h = 3.9000000000, r1 = 2.8750000000, r2 = 5.4000000000);
						}
						#translate(v = [0, 0, -14.0000000000]) {
							cylinder(h = 14, r = 2.8750000000);
						}
						#translate(v = [0, 0, -14.0000000000]) {
							cylinder(h = 14, r = 2.6000000000);
						}
					}
					union();
				}
			}
		}
		translate(v = [-15.0000000000, 0.0000000000, 0]) {
			translate(v = [0, 0, -100]) {
				cylinder(h = 200, r = 3.2500000000);
			}
		}
		translate(v = [0, 0, -100]) {
			cylinder(h = 200, r = 3.2500000000);
		}
		translate(v = [15.0000000000, 0.0000000000, 0]) {
			translate(v = [0, 0, -100]) {
				cylinder(h = 200, r = 3.2500000000);
			}
		}
		translate(v = [-15.0000000000, 0.0000000000, 0]) {
			translate(v = [0, 0, -100]) {
				cylinder(h = 200, r = 1.8000000000);
			}
		}
		translate(v = [-7.5000000000, 0.0000000000, 0]) {
			translate(v = [0, 0, -100]) {
				cylinder(h = 200, r = 1.8000000000);
			}
		}
		translate(v = [0, 0, -100]) {
			cylinder(h = 200, r = 1.8000000000);
		}
		translate(v = [7.5000000000, 0.0000000000, 0]) {
			translate(v = [0, 0, -100]) {
				cylinder(h = 200, r = 1.8000000000);
			}
		}
		translate(v = [15.0000000000, 0.0000000000, 0]) {
			translate(v = [0, 0, -100]) {
				cylinder(h = 200, r = 1.8000000000);
			}
		}
	}
}
